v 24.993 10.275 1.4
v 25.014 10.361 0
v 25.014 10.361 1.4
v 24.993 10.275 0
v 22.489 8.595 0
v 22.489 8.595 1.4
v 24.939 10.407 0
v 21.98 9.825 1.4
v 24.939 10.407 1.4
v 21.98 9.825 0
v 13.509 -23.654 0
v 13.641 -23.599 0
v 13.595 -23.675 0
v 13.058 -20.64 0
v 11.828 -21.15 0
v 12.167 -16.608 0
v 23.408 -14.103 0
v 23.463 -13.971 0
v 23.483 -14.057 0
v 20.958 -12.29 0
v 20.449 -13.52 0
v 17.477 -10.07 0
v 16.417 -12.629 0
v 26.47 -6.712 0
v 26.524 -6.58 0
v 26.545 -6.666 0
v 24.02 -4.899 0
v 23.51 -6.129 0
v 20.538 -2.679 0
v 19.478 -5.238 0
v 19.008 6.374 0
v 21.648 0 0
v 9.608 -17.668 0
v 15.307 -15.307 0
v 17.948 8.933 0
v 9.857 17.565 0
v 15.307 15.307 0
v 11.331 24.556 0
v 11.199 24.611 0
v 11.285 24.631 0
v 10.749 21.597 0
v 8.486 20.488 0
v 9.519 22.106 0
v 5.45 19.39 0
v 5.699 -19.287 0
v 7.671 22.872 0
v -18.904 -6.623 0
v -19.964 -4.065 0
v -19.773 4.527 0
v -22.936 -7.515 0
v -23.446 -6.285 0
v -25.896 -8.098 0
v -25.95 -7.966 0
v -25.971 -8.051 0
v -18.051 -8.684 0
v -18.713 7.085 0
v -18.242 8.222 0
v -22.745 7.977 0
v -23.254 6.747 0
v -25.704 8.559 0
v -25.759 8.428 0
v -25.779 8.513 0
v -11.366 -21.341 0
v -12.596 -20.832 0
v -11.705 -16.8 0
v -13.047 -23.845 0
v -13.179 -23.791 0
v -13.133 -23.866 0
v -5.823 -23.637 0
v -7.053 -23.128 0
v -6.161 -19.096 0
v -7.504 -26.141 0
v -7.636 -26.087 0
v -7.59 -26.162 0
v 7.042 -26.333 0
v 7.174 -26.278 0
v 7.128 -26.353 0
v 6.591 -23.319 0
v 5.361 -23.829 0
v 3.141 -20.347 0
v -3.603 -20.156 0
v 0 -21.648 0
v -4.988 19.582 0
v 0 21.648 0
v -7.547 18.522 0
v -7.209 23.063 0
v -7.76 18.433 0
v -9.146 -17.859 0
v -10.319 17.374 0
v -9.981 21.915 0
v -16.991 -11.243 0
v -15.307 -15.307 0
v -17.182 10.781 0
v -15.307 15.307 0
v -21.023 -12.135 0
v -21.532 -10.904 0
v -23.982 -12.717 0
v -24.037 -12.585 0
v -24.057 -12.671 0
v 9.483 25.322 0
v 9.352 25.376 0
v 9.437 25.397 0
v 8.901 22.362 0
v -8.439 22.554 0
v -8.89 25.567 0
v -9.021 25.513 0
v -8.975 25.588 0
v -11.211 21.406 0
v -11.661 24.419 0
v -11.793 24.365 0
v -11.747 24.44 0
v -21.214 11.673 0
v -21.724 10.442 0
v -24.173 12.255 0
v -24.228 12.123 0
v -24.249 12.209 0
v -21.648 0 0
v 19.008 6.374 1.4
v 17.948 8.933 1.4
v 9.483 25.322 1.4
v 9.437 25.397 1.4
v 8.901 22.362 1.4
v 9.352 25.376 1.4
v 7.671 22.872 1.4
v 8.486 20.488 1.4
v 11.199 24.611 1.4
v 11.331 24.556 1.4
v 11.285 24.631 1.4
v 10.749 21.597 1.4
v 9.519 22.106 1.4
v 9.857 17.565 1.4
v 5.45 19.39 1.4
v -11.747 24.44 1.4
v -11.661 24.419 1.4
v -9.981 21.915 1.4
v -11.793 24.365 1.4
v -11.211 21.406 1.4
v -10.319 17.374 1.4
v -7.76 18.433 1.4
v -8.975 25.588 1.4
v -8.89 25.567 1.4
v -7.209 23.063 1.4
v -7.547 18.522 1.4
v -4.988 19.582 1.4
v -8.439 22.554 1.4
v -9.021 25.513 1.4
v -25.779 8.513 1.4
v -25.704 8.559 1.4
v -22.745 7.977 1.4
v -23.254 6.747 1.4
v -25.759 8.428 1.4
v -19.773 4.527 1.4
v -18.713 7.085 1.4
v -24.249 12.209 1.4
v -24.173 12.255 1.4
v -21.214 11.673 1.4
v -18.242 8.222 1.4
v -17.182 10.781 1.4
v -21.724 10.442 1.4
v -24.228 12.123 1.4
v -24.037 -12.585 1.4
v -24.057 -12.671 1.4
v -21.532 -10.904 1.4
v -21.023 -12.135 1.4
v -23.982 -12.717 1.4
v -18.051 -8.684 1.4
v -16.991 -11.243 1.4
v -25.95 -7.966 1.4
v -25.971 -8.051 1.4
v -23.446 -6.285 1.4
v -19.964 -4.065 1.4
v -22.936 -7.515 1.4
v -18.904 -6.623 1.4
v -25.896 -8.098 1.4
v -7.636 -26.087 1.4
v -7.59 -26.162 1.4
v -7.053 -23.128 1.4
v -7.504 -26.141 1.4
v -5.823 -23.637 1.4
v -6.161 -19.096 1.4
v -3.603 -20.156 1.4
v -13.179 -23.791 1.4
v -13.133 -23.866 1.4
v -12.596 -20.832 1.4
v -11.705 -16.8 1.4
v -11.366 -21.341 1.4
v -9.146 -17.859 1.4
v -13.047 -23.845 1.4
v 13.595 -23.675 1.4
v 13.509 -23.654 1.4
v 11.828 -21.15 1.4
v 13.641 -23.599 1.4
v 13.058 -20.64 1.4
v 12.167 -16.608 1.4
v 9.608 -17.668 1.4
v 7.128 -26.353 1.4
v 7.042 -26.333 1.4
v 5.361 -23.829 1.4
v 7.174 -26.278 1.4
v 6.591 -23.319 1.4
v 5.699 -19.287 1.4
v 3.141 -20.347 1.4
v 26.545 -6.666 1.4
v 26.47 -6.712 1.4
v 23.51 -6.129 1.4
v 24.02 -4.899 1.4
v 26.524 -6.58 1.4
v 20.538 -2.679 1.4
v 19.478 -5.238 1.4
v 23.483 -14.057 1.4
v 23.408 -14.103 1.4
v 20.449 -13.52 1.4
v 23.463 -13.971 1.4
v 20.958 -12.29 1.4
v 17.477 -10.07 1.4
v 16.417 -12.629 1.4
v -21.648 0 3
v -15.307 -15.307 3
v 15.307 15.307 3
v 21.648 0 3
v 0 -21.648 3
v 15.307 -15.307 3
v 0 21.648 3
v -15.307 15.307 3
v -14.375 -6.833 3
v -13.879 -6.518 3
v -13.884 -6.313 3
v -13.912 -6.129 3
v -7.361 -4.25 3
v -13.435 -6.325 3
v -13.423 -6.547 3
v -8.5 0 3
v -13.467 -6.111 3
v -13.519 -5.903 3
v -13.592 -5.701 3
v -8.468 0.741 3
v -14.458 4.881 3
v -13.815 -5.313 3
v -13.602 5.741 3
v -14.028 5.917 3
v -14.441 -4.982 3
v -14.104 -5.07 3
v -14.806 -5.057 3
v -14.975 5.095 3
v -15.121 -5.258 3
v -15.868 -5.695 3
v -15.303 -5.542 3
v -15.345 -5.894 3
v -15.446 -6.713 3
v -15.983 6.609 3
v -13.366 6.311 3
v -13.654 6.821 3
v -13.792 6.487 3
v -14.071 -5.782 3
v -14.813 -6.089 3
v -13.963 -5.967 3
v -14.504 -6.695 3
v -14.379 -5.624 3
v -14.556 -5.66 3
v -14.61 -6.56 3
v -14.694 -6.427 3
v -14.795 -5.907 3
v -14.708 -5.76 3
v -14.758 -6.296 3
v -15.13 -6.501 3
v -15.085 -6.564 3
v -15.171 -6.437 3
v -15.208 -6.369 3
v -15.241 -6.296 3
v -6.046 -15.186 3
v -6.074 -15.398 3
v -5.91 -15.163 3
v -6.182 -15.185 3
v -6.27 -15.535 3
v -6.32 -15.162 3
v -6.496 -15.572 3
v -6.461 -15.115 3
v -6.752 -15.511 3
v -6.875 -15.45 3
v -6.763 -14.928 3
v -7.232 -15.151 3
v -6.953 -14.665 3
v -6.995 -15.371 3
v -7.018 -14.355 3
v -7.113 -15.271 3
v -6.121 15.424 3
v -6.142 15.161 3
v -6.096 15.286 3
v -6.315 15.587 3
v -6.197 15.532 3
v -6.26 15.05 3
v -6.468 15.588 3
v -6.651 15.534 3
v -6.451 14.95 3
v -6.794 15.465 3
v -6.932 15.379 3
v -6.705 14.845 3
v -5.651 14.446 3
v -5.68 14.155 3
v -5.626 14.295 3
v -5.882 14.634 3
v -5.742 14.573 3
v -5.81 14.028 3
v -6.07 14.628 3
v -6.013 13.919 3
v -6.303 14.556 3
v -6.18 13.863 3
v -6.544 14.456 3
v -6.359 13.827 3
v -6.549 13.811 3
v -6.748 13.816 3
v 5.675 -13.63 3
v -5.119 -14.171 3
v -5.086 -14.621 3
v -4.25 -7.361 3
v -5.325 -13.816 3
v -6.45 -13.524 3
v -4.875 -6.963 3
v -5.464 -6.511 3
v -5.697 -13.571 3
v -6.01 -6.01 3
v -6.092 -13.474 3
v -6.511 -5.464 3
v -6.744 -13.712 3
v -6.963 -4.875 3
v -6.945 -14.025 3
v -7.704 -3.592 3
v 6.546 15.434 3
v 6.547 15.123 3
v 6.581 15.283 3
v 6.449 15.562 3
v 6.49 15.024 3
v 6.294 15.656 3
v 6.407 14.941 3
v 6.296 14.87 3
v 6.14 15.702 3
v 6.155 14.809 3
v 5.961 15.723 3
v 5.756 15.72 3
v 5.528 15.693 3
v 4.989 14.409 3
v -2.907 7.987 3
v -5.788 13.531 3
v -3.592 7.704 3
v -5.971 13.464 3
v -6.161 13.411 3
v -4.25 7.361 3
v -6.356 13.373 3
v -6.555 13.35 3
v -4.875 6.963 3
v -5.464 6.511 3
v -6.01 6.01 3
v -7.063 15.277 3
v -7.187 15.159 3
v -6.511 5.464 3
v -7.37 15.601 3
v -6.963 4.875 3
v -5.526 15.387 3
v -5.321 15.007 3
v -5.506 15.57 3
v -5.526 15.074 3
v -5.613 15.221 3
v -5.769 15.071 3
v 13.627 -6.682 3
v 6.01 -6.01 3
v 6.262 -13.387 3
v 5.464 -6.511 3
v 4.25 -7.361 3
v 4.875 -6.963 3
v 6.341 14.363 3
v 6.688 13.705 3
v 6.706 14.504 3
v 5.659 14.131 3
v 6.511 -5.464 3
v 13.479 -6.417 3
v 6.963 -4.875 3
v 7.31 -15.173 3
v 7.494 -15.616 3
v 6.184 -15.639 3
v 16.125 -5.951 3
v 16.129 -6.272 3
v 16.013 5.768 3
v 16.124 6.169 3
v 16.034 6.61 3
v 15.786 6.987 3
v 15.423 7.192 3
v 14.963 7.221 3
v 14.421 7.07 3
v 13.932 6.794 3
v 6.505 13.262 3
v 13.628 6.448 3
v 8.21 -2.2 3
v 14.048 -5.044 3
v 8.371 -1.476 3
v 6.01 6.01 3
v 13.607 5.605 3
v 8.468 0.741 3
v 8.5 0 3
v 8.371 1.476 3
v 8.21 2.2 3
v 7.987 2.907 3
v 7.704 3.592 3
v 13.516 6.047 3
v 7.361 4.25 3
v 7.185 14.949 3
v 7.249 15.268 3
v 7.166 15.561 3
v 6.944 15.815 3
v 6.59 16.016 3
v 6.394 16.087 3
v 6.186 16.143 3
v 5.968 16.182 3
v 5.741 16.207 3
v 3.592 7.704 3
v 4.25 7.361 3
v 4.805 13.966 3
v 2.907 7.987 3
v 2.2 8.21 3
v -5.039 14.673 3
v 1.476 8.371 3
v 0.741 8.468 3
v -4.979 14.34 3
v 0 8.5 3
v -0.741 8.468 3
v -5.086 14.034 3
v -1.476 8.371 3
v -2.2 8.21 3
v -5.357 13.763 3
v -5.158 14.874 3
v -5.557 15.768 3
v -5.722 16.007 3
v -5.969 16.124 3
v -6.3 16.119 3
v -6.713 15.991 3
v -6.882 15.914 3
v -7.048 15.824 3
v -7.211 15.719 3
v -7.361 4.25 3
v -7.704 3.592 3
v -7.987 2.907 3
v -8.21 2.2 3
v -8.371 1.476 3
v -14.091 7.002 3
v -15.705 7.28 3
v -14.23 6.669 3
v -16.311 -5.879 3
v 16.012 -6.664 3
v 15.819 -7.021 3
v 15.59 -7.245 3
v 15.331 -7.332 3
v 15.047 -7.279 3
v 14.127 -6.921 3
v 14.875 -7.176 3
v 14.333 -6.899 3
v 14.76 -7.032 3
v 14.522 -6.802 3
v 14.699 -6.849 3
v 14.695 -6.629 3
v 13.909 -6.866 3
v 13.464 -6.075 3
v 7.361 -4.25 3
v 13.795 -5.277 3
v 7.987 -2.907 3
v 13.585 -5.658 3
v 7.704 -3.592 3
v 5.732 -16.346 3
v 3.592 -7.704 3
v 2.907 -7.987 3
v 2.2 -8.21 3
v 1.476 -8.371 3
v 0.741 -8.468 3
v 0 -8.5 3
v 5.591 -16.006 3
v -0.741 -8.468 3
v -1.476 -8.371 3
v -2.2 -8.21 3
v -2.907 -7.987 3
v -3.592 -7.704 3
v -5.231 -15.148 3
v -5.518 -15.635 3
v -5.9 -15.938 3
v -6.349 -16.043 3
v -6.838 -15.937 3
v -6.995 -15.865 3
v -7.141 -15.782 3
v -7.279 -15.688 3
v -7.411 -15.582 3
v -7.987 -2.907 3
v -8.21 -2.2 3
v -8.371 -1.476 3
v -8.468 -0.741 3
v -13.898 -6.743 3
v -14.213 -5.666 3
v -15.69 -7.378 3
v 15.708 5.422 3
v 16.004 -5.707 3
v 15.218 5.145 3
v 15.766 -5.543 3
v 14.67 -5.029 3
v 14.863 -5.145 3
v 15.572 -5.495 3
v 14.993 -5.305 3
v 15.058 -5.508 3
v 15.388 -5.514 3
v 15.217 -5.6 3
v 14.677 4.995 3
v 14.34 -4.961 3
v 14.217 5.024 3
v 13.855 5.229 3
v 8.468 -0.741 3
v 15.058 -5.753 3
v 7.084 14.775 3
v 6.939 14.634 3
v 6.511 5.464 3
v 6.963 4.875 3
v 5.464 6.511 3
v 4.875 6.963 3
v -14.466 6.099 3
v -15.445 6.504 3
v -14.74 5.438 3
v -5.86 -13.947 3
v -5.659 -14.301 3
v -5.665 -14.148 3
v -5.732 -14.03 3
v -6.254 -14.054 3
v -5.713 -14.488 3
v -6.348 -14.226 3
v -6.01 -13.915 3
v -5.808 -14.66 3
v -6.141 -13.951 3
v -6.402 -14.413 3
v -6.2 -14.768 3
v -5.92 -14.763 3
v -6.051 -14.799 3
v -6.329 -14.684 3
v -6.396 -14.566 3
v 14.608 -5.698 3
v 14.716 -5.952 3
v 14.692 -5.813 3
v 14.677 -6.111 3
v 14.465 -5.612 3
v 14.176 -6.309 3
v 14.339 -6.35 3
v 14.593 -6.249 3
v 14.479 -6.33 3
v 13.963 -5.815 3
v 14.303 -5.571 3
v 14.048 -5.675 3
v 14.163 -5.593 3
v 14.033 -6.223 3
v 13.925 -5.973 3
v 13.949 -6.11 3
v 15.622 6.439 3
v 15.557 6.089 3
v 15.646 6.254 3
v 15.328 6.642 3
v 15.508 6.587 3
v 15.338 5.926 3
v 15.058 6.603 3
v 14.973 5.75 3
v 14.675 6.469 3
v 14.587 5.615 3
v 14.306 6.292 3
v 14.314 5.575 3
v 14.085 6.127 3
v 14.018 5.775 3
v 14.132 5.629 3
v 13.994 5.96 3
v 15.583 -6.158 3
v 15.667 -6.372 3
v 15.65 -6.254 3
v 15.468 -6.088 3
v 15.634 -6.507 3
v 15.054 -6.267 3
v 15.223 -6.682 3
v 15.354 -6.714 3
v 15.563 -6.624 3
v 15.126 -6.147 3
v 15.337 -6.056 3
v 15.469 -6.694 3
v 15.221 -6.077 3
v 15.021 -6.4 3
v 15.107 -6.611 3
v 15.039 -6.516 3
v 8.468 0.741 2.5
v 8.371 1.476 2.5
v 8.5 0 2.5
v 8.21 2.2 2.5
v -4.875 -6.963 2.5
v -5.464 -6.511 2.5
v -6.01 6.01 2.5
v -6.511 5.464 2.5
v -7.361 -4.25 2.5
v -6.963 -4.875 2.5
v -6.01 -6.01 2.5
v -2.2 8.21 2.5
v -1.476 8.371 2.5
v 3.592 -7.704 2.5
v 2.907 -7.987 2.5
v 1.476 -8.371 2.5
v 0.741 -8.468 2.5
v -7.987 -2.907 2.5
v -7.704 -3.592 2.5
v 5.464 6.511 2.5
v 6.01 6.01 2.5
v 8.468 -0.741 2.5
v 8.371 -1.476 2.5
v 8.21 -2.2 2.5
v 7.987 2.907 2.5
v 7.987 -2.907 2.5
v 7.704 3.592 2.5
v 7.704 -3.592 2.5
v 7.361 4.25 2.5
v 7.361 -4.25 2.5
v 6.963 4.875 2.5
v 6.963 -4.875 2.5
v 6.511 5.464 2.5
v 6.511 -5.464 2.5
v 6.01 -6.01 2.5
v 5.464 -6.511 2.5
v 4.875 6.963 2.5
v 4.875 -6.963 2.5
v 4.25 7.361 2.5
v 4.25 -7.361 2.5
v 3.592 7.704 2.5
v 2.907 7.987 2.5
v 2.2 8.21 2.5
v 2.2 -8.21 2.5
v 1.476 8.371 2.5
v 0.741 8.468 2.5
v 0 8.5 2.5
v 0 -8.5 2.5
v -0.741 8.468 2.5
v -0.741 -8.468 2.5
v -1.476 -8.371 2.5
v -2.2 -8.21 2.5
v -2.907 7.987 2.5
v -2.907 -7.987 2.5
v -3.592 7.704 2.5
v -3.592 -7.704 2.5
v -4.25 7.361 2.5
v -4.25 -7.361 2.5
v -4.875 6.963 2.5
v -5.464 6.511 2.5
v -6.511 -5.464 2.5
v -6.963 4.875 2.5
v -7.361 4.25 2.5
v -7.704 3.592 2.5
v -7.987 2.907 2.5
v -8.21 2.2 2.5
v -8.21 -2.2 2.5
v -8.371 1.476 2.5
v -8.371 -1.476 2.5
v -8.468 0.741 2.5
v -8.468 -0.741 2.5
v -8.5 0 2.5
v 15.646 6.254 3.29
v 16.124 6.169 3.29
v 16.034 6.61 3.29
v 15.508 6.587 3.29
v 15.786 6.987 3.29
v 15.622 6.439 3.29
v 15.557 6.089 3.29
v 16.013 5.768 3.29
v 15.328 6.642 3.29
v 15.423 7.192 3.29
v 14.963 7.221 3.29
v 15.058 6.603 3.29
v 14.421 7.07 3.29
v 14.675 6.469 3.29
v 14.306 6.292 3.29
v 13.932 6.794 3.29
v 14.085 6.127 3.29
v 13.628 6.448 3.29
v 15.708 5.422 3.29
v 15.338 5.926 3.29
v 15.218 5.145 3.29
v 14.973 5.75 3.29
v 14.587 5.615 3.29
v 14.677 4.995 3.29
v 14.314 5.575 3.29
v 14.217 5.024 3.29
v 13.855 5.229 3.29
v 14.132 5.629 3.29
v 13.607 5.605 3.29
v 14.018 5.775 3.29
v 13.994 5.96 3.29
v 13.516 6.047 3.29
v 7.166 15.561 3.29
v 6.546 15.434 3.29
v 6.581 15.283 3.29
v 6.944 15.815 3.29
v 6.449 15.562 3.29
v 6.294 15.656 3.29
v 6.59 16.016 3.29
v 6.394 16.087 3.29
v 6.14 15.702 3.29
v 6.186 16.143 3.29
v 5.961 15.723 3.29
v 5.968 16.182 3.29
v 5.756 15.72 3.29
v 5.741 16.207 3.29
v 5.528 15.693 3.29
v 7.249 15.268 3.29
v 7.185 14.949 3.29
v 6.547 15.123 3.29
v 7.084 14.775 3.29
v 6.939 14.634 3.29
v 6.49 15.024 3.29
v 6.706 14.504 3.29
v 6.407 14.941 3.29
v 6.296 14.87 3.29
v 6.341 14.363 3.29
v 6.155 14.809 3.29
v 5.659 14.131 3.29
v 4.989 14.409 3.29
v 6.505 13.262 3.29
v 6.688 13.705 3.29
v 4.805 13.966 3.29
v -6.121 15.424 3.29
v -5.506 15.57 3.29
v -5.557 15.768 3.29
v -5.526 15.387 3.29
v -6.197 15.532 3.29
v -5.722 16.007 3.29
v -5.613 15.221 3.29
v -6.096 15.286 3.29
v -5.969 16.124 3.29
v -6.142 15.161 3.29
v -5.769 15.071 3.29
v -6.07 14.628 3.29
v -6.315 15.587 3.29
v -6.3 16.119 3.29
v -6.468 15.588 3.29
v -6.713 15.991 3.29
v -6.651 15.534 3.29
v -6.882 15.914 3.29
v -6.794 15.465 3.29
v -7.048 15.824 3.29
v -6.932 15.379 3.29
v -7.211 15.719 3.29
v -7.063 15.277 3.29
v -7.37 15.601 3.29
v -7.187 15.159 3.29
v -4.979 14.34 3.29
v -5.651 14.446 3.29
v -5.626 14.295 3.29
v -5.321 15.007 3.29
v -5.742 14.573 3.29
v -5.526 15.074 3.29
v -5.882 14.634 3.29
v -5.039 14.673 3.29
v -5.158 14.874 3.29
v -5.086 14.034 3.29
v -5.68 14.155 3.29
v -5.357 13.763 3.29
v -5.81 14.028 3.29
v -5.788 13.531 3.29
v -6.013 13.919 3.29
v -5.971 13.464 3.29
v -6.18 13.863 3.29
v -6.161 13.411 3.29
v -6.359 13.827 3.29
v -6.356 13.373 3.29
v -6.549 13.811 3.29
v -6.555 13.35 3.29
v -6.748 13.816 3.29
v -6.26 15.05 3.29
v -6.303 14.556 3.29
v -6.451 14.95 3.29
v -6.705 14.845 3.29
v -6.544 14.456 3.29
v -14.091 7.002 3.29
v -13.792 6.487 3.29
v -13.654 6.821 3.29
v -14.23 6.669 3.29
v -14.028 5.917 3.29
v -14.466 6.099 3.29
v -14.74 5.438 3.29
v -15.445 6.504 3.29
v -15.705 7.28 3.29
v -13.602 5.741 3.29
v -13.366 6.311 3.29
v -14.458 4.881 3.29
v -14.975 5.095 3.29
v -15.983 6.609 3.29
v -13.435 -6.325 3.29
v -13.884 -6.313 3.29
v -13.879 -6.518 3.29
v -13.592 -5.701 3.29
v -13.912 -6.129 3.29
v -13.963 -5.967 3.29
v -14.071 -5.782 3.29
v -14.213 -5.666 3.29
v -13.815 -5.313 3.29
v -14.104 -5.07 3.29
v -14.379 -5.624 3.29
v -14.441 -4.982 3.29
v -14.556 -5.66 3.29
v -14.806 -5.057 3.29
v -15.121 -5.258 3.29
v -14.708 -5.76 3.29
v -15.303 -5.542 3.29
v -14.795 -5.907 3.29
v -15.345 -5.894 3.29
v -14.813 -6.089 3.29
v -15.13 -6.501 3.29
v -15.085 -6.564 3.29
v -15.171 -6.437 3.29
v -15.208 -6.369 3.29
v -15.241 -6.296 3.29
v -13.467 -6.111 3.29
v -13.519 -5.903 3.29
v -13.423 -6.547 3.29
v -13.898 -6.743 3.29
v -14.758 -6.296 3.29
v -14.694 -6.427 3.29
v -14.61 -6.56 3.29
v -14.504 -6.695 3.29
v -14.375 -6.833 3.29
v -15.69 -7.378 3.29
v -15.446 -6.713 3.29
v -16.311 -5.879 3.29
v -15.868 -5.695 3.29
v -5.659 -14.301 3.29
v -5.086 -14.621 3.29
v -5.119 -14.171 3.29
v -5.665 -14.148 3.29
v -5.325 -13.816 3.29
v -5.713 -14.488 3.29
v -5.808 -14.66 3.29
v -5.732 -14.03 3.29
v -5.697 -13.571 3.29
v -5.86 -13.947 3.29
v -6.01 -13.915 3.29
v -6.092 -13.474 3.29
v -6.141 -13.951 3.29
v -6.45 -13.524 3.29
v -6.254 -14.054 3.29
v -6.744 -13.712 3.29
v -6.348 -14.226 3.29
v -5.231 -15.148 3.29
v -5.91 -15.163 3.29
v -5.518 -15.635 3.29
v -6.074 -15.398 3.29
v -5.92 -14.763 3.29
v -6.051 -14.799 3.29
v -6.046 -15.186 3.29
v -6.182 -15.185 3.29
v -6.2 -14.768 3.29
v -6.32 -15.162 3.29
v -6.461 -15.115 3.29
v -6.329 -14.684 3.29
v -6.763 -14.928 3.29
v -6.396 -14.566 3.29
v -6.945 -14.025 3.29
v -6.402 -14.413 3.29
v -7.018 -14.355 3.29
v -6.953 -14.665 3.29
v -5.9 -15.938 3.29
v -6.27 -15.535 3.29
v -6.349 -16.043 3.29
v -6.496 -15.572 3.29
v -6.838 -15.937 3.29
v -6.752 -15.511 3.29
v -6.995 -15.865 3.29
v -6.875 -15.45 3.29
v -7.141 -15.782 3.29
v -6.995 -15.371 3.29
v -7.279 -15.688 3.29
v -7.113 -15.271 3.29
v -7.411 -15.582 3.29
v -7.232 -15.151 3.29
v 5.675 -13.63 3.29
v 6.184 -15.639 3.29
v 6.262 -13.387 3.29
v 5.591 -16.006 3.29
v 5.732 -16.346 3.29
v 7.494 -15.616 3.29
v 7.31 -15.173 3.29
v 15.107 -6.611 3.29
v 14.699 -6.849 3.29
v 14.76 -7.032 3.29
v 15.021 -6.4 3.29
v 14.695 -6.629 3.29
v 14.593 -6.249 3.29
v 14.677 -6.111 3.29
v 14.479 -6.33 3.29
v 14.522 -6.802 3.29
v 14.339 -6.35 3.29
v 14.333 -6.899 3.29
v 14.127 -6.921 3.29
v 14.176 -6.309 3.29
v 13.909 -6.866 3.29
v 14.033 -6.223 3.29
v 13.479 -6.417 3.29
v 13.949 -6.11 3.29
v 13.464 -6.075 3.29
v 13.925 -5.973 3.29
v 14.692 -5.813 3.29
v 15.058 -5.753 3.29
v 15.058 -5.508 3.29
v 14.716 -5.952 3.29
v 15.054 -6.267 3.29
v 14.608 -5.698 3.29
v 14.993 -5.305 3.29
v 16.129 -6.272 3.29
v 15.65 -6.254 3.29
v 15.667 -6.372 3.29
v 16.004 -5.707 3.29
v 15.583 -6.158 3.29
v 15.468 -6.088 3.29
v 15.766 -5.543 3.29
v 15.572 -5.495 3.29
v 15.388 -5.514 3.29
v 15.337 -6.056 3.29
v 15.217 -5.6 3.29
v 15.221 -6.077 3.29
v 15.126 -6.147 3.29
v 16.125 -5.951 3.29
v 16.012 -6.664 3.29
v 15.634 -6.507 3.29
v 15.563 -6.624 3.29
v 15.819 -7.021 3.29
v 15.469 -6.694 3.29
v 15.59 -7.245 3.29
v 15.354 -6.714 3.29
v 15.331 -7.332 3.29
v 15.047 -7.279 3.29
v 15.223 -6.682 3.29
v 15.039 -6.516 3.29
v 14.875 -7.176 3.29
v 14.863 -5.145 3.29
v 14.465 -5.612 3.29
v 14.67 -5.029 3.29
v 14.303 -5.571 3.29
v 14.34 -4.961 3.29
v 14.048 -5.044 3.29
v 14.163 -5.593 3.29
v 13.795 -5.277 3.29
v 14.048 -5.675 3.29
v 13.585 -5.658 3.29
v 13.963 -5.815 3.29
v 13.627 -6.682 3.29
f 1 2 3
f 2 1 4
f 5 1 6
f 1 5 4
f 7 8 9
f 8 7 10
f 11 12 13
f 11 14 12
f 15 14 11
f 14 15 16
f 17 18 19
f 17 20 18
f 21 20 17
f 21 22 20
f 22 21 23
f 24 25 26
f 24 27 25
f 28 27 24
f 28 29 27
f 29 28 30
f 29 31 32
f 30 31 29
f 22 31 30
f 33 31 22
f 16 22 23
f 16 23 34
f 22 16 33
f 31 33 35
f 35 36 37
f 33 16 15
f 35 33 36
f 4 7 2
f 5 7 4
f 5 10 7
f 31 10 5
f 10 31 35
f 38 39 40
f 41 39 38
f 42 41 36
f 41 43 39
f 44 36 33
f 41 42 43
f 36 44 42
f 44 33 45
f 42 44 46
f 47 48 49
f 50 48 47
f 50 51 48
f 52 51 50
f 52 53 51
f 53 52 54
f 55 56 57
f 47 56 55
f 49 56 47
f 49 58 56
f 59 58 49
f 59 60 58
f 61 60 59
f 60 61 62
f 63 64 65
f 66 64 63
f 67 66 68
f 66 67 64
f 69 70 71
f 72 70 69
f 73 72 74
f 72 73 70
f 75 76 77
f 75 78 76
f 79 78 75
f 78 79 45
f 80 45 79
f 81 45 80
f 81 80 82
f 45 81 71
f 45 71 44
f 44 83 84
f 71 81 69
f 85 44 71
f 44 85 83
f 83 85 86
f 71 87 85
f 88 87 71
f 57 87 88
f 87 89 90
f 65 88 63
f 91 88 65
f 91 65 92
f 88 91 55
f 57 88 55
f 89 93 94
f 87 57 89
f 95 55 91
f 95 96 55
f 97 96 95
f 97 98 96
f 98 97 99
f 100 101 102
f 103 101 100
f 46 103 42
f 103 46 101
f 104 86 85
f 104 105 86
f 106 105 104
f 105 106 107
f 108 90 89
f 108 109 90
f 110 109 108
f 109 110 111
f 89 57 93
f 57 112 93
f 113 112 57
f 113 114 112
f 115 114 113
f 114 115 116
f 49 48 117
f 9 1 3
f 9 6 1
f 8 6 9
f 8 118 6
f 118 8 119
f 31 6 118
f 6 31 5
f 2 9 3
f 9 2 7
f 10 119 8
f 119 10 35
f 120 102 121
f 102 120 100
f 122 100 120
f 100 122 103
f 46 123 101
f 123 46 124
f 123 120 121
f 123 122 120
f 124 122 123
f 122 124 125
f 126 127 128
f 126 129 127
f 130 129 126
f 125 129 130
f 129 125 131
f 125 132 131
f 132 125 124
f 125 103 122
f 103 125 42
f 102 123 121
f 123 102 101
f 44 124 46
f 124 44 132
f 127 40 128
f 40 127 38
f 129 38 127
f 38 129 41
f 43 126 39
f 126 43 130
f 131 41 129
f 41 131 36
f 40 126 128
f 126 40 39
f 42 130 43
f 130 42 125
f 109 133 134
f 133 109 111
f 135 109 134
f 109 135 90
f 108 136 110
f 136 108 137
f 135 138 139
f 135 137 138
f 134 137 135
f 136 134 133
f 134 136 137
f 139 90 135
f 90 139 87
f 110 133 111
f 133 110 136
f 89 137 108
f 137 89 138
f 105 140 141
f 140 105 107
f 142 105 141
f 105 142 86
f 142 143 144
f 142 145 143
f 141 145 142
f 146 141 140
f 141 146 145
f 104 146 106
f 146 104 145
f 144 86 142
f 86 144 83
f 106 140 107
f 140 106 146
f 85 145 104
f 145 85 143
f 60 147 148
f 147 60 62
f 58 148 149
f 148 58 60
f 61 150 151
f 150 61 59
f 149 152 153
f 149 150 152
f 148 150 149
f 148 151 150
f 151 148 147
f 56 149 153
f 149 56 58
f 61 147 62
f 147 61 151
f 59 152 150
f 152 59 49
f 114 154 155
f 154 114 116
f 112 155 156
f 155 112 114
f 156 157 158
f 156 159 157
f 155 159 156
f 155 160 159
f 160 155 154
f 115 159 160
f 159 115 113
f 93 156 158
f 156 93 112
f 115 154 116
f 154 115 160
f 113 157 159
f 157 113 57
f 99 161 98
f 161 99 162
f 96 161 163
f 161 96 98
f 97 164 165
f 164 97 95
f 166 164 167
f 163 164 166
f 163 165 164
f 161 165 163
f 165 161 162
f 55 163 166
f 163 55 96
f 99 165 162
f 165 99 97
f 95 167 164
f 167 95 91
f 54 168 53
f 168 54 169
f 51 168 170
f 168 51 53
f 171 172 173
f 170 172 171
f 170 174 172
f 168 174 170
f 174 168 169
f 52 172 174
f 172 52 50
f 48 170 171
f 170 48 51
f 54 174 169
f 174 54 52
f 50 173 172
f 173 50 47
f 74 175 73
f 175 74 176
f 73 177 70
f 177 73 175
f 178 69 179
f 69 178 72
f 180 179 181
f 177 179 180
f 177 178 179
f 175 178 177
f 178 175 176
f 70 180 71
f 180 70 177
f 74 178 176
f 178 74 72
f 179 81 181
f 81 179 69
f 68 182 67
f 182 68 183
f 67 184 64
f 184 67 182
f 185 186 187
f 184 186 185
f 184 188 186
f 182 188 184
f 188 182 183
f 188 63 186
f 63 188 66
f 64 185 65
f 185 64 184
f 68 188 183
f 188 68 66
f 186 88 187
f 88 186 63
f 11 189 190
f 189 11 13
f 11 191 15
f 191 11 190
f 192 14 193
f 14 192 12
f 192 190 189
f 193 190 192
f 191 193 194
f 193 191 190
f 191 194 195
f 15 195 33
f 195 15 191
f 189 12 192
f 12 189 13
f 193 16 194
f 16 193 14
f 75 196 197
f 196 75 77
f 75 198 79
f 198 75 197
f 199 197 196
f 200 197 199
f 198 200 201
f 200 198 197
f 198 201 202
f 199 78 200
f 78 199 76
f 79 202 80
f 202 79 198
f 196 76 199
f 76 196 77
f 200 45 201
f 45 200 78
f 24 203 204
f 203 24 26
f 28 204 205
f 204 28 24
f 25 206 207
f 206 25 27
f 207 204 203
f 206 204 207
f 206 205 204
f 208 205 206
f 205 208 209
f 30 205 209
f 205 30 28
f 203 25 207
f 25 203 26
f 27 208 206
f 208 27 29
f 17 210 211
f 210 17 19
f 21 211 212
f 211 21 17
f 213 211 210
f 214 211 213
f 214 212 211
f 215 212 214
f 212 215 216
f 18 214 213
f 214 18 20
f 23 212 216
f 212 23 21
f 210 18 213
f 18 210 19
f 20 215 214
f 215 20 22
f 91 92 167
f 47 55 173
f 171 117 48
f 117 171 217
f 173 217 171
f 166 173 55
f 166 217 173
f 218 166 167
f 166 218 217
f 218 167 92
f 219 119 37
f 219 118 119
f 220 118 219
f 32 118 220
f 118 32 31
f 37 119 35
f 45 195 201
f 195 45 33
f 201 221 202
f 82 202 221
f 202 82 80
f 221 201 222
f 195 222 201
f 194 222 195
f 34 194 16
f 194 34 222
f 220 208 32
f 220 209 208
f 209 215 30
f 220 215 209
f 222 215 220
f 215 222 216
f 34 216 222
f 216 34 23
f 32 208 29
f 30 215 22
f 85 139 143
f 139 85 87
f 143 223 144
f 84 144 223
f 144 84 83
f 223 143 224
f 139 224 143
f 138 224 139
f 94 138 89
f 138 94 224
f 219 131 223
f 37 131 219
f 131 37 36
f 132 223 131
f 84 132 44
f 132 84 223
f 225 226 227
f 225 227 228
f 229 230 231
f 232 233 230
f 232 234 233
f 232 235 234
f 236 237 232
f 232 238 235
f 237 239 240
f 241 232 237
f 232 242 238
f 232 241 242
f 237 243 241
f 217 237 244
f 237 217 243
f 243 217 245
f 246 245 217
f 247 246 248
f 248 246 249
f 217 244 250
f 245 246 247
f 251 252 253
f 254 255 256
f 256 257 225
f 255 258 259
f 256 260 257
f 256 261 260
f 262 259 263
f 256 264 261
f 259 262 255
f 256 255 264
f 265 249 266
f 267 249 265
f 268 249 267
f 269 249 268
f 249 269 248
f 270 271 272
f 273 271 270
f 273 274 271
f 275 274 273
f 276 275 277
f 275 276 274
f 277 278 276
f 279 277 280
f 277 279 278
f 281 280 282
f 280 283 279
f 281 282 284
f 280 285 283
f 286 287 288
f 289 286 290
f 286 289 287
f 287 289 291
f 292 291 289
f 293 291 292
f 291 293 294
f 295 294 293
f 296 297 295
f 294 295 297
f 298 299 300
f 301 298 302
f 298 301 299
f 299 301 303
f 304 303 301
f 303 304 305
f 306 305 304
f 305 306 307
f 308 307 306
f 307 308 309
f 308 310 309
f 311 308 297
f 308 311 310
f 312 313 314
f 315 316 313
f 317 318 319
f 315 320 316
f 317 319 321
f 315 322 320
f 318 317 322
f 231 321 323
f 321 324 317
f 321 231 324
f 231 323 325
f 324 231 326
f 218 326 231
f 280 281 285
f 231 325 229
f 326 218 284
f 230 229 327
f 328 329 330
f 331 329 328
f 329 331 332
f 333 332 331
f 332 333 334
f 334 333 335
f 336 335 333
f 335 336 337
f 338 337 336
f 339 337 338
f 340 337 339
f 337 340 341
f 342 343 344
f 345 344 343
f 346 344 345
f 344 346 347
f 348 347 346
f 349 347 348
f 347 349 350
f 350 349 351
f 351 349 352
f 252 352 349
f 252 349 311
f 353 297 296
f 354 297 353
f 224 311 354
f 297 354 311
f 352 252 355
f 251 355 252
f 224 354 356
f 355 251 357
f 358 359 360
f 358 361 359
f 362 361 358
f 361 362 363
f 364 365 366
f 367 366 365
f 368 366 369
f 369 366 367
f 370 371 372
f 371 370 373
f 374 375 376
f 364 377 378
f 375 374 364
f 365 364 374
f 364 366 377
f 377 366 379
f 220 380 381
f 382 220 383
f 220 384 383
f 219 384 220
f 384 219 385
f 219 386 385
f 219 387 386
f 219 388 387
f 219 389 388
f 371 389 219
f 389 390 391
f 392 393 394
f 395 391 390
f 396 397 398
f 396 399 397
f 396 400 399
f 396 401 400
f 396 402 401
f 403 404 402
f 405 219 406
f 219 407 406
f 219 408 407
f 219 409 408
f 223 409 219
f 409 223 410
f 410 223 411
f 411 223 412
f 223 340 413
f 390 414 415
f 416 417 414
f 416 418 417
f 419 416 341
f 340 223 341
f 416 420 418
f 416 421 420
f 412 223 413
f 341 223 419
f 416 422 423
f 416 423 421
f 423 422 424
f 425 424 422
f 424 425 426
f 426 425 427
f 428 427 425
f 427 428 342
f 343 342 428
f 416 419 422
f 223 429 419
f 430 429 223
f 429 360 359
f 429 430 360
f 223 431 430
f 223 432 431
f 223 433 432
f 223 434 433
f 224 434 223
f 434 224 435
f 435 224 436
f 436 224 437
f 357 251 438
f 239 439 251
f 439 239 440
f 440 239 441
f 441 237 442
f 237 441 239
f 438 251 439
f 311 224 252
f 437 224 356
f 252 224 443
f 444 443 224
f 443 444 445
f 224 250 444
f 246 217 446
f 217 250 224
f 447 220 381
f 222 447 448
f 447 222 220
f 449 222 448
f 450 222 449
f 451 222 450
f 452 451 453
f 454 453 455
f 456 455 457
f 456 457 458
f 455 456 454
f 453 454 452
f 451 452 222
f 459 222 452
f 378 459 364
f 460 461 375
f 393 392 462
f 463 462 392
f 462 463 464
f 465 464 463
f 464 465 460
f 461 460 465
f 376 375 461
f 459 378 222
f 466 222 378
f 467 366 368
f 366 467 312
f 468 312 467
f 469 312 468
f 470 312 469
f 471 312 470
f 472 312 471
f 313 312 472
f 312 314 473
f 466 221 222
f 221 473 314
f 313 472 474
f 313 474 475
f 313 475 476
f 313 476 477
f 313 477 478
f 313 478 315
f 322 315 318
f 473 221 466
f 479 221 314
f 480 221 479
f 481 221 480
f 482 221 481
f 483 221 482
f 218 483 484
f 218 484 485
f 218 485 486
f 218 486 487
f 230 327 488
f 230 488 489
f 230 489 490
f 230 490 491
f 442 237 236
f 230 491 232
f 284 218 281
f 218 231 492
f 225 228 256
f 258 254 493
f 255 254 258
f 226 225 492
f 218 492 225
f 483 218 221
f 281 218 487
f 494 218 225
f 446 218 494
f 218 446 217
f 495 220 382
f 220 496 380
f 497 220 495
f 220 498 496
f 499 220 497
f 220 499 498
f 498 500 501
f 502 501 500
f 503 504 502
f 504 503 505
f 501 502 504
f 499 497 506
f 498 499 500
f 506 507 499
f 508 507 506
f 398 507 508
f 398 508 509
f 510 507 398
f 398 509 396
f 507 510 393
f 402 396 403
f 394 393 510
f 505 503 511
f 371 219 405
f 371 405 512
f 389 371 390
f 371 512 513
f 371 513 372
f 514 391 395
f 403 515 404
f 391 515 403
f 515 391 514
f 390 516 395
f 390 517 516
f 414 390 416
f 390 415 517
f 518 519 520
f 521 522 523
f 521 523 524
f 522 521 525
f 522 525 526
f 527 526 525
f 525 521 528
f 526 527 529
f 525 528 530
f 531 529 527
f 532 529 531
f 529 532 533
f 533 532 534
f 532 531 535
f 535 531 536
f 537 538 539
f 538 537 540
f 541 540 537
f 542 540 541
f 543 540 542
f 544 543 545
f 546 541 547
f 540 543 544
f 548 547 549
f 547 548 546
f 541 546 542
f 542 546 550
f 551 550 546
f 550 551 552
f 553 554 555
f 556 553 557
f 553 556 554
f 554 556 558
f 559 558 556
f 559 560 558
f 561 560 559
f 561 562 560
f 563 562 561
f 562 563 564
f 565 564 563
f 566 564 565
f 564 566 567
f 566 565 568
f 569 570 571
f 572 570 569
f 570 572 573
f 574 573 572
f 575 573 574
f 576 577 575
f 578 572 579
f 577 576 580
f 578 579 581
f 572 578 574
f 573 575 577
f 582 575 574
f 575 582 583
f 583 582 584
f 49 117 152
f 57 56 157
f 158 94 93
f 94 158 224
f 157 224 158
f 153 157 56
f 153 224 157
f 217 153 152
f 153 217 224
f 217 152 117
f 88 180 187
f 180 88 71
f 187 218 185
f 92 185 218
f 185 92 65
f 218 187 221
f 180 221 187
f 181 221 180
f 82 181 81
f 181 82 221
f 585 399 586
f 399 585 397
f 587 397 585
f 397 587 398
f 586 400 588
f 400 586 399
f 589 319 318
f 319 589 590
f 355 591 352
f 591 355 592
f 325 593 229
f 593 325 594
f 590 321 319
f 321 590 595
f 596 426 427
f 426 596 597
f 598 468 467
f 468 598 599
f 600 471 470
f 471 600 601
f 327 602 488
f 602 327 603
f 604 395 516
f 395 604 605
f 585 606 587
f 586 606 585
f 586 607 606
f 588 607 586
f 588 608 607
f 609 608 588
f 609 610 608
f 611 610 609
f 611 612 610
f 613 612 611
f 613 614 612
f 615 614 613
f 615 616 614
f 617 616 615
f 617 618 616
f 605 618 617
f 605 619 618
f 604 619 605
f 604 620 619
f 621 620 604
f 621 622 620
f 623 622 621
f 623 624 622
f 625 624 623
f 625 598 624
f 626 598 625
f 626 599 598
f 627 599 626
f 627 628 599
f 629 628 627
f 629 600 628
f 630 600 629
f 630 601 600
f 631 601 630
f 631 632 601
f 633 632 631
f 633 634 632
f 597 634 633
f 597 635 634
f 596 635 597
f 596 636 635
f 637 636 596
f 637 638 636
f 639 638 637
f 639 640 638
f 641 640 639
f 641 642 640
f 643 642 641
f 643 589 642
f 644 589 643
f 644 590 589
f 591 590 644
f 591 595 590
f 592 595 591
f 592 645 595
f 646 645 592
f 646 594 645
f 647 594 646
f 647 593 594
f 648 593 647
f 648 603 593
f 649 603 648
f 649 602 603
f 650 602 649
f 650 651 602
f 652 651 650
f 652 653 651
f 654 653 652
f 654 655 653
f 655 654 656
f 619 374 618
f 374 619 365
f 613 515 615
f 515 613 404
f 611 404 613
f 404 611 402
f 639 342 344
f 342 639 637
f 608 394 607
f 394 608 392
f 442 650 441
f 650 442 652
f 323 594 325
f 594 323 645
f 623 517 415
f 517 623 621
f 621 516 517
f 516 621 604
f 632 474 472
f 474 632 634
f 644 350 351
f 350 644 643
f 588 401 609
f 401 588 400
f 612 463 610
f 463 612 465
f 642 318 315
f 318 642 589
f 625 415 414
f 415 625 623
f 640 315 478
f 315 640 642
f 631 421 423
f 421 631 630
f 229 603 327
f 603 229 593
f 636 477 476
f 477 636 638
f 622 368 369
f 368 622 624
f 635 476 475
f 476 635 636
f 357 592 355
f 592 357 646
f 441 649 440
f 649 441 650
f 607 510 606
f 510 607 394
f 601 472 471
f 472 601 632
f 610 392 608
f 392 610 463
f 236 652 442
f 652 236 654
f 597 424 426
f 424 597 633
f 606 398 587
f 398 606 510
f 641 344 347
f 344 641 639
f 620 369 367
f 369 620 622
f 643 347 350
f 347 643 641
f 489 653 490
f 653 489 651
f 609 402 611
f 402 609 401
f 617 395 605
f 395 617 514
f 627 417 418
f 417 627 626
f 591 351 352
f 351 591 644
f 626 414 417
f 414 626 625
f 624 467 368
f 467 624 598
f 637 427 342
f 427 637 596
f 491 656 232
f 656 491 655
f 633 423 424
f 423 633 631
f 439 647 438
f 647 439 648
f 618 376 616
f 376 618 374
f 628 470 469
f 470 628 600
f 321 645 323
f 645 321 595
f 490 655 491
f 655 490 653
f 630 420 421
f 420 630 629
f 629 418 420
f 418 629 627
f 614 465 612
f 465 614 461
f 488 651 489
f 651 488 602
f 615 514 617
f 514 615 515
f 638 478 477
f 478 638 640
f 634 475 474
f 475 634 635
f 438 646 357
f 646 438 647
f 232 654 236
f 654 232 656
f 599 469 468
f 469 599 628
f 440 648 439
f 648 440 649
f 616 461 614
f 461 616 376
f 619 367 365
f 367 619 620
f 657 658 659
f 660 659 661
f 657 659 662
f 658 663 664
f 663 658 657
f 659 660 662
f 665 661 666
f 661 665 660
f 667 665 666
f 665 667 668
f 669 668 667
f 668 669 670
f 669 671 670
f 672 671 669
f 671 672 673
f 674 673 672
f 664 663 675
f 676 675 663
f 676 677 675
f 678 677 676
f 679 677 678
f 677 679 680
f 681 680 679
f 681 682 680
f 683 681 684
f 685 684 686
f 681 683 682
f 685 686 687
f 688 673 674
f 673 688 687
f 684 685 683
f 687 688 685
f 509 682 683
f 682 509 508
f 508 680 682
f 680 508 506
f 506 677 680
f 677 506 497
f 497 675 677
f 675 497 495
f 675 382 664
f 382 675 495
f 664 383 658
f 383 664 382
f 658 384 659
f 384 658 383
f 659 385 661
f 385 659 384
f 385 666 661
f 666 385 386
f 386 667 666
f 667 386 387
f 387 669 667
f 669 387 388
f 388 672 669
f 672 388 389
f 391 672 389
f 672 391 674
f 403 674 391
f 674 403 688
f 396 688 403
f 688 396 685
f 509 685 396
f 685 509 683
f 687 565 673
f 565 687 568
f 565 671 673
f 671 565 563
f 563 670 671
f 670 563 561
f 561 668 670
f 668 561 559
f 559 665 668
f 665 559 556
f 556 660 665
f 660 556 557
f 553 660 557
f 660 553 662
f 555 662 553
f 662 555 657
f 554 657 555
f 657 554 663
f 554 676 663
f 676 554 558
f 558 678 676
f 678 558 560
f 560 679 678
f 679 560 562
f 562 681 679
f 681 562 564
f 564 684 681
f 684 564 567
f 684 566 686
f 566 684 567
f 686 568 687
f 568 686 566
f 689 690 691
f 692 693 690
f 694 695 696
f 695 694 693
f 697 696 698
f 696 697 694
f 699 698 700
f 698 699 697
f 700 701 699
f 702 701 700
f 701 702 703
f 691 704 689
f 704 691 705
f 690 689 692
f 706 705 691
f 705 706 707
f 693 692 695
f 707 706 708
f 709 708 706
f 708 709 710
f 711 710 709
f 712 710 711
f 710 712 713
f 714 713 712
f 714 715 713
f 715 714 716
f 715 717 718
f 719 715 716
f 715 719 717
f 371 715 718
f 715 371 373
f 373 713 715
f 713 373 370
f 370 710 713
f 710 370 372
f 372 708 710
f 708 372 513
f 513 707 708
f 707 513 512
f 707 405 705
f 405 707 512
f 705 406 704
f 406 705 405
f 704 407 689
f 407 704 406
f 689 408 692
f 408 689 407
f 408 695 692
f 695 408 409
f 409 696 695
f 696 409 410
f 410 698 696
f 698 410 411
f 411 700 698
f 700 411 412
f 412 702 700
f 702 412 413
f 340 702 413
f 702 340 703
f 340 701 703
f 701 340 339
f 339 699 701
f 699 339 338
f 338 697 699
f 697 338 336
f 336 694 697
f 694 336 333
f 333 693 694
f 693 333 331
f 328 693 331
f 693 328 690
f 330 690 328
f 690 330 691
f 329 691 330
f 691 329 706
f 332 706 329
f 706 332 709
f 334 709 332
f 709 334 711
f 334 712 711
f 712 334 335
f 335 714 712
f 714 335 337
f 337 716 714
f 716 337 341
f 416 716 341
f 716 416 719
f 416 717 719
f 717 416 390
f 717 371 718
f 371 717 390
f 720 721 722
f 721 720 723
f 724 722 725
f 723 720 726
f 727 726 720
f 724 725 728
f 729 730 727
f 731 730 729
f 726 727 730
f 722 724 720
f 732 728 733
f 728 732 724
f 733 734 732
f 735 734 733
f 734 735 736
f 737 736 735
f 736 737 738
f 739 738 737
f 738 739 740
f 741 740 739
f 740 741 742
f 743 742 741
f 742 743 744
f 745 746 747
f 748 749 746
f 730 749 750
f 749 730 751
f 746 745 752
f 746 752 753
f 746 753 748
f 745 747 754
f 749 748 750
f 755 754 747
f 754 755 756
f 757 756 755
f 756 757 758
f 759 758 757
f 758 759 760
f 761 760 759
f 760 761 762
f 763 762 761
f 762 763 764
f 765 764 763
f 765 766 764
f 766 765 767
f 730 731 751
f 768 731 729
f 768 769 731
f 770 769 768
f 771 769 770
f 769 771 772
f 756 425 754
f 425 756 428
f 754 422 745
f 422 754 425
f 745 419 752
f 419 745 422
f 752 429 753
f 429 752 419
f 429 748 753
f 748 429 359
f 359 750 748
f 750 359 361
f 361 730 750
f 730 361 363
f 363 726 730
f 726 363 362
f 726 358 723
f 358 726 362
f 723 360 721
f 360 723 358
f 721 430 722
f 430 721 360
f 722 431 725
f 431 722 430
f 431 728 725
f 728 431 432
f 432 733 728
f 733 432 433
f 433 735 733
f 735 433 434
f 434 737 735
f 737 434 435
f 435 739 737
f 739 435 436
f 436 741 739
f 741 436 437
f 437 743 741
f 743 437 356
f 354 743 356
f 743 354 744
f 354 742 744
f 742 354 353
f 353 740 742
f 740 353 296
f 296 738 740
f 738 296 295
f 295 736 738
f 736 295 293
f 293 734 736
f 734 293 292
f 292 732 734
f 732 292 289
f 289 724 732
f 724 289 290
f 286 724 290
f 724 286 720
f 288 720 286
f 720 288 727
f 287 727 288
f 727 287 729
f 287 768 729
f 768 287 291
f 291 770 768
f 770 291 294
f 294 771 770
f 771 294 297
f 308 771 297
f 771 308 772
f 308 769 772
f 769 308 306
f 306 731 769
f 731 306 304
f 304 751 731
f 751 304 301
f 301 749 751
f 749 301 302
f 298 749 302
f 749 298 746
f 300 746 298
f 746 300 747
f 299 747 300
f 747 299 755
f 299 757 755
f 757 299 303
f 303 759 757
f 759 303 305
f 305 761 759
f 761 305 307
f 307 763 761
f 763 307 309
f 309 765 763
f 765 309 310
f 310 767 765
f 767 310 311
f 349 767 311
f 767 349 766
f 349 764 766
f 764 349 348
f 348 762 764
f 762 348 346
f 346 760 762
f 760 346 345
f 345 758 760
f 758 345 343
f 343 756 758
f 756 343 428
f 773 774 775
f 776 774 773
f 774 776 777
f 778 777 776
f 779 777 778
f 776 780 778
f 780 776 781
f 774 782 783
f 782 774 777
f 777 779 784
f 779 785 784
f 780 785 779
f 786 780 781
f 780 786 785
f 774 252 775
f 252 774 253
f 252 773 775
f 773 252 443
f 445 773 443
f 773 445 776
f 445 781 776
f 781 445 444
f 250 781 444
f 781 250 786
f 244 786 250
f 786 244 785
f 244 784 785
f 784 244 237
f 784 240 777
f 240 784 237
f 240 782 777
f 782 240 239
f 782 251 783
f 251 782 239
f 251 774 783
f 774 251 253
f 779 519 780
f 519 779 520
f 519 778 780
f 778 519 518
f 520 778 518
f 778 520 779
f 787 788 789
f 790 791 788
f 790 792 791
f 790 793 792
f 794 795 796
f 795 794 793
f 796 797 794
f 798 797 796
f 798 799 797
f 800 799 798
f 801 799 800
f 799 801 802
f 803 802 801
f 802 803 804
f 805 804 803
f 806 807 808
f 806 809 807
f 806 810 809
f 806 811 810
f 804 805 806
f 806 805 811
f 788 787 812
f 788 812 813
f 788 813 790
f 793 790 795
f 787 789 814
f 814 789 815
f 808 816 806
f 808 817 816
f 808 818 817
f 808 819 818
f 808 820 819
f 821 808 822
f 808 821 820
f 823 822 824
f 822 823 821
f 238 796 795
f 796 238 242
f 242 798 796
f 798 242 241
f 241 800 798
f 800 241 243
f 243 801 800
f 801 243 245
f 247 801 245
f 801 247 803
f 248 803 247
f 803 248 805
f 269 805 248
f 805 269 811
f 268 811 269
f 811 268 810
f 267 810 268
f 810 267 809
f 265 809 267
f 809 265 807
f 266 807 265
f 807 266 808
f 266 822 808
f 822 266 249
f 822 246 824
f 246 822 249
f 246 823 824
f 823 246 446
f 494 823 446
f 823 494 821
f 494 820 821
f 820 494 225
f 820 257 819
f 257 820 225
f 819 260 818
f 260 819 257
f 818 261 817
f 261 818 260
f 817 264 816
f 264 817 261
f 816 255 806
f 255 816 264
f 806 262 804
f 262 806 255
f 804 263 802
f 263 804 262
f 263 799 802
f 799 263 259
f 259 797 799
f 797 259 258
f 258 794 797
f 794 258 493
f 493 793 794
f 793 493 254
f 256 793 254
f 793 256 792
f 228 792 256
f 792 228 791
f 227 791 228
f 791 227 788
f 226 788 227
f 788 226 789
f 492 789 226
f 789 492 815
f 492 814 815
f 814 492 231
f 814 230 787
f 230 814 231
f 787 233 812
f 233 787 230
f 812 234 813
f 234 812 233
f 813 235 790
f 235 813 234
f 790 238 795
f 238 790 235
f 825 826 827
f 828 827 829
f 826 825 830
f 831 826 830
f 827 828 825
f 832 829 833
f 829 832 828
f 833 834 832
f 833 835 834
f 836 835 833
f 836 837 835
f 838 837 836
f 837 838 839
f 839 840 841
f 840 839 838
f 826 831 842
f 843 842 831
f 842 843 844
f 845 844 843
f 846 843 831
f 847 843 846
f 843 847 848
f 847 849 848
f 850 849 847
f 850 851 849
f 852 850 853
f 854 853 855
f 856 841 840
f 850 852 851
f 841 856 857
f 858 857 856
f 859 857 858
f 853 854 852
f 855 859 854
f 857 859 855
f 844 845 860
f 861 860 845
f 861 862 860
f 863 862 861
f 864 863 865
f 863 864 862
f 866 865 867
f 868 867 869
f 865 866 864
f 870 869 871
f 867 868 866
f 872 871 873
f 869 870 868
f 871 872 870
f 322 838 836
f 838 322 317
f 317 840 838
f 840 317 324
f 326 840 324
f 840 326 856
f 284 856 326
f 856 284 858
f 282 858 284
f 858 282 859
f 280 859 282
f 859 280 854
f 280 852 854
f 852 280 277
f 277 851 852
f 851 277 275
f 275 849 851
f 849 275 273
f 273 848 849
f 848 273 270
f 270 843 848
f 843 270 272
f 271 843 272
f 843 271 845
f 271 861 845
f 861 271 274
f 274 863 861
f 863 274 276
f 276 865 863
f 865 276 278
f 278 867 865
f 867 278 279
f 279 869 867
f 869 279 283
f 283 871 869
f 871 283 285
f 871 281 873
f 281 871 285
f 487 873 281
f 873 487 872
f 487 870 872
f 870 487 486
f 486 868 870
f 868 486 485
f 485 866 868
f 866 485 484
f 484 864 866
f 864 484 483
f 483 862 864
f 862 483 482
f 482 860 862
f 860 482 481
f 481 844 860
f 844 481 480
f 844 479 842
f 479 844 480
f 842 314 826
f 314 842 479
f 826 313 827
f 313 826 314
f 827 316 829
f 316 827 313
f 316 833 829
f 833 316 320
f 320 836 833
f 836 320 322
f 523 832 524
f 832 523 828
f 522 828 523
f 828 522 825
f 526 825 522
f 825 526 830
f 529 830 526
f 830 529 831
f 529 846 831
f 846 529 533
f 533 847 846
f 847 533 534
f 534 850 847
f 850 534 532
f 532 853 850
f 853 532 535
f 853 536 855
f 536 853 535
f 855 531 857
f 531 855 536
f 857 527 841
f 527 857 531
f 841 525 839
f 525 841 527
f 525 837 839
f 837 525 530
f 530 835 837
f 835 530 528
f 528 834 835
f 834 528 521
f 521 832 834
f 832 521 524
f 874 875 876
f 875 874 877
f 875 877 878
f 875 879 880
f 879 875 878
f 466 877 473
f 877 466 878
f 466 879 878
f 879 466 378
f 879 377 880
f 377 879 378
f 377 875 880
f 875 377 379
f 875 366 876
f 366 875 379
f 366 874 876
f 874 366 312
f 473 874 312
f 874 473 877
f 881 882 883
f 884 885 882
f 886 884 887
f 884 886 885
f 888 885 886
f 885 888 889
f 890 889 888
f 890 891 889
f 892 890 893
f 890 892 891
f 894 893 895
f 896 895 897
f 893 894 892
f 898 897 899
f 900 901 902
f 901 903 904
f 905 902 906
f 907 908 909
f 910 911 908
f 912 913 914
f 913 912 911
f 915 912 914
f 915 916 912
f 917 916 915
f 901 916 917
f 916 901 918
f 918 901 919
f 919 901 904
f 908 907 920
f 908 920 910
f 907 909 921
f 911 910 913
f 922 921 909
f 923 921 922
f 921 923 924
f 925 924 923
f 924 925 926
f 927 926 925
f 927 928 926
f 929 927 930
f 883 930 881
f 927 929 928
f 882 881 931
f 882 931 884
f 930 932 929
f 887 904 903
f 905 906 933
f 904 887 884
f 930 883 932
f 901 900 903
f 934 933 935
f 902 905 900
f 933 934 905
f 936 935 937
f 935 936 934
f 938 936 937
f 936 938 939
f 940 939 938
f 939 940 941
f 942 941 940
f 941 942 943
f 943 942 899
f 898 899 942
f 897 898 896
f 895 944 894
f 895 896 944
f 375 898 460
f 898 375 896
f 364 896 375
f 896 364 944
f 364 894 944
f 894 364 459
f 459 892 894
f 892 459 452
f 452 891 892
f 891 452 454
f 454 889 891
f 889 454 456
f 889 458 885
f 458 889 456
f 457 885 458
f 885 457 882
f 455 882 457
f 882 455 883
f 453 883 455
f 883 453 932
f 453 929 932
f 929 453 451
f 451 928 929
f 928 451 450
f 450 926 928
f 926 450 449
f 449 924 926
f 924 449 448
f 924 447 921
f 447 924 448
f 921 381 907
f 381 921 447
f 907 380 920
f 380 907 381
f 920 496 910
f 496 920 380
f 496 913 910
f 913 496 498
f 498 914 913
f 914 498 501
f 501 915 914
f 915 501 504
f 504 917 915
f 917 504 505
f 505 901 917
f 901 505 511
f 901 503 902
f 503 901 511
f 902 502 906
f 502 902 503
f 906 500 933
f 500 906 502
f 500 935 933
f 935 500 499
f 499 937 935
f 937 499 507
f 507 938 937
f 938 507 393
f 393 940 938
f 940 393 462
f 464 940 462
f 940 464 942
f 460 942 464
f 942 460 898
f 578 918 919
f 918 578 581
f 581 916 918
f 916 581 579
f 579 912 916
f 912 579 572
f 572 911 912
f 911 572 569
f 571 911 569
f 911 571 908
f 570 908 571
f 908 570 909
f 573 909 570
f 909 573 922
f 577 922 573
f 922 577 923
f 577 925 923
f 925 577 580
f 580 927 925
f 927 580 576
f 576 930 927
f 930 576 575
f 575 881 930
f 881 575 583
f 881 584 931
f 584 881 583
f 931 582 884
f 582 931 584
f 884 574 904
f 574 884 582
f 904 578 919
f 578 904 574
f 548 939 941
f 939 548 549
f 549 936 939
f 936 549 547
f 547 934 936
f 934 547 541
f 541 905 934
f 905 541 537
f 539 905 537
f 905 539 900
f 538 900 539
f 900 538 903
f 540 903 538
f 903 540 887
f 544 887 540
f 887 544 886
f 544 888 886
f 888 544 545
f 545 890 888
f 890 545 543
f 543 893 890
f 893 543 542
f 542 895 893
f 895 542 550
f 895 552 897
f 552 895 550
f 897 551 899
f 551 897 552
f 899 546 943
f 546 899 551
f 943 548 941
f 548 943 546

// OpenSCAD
// 2-Point Discrimination Wheel — parametric n-gon, COUNTERclockwise order + split thickness

distances_mm       = is_undef(distances_mm) ? [0,2,3,4,5,6,7,8] : distances_mm;

// --- geometry ---
outer_flat_to_flat = is_undef(outer_flat_to_flat) ? 40 : outer_flat_to_flat;
body_thickness     = is_undef(body_thickness) ? 3 : body_thickness;   // <-- NEW: octagon thickness
prong_thickness    = is_undef(prong_thickness) ? 1.4 : prong_thickness; // <-- NEW: prong thickness

spike_length  = is_undef(spike_length) ? 7 : spike_length;
base_d        = is_undef(base_d) ? 3 : base_d;
shank_d       = is_undef(shank_d) ? 1.4 : shank_d;
tip_d         = is_undef(tip_d) ? 0.15 : tip_d;
root_overlap  = is_undef(root_overlap) ? .7 : root_overlap;

// --- labels / hub ---
label_size    = is_undef(label_size) ? 2.5 : label_size;
label_depth   = is_undef(label_depth) ? .3 : label_depth;
font_name     = is_undef(font_name) ? "DejaVu Sans:style=Bold" : font_name;
label_radial  = is_undef(label_radial) ? 0.80 : label_radial;
hub_diameter  = is_undef(hub_diameter) ? 17 : hub_diameter;
thumb_depth   = is_undef(thumb_depth) ? .5 : thumb_depth;

// optional (you weren’t actually applying it anywhere)
chamfer = is_undef(chamfer) ? 0.8 : chamfer;
$fn = is_undef($fn) ? 72 : $fn;

function apothem(across_flats,n)=across_flats/2;
function circ_radius(across_flats,n)=across_flats/(2*cos(180/n));

// Use BODY thickness for anything “top referenced”
function total_thickness()=body_thickness + max(chamfer,0);

module polygon_plate(n, across_flats, thk){
  r = circ_radius(across_flats,n);
  linear_extrude(thk)
    polygon(points=[for(i=[0:n-1]) let(a=360*i/n)[r*cos(a), r*sin(a)]]);
}

module spike_single_flat(len=spike_length,bd=base_d,sd=shank_d,td=tip_d){
  base_r=bd/2; shank_r=sd/2; tip_r=td/2;
  bx=-root_overlap; sx=len*0.55; tx=len;

  // <-- prongs extrude ONLY prong_thickness (still from z=0 up)
  linear_extrude(height=prong_thickness)
  union(){
    translate([bx,0]) circle(r=base_r);
    hull(){translate([bx,0])circle(r=base_r);translate([sx,0])circle(r=shank_r);}
    hull(){translate([sx,0])circle(r=shank_r);translate([tx,0])circle(r=tip_r);}
  }
}

module thumb_well_top(){
  // Subtract well from TOP of the BODY (not the prongs)
  translate([0,0,body_thickness - thumb_depth])
    cylinder(h=thumb_depth,d=hub_diameter,$fn=72);
}

module edge_numbers_top(distances,a){
  n=len(distances);
  for(i=[0:n-1]){
    // <-- COUNTERclockwise progression (positive angle)
    angN=+360*(i+0.5)/n;

    translate([(label_radial*a)*cos(angN),
               (label_radial*a)*sin(angN),
               body_thickness - 0.01])
      rotate([0,0,angN-90])
        linear_extrude(height=label_depth)
          text(str(distances[i]),
               size=label_size,font=font_name,
               halign="center",valign="center");
  }
}

module wheel_solid(distances){
  n=len(distances);
  a=apothem(outer_flat_to_flat,n);

  union(){
    // <-- body uses body_thickness
    polygon_plate(n,outer_flat_to_flat,body_thickness);

    for(i=[0:n-1]){
      // <-- COUNTERclockwise progression (positive angle)
      angN=+360*(i+0.5)/n;

      translate([a*cos(angN),a*sin(angN),0])
        rotate([0,0,angN]){
          sep=distances[i];
          translate([0,+sep/2,0]) spike_single_flat();
          translate([0,-sep/2,0]) spike_single_flat();
        }
    }
  }
}

module discriminator(distances){
  n=len(distances);
  assert(n>=3,"distances_mm must have at least 3 entries.");

  union(){
    difference(){
      wheel_solid(distances);
      thumb_well_top();
    }
    edge_numbers_top(distances, apothem(outer_flat_to_flat,n));
  }
}

discriminator(distances_mm);
